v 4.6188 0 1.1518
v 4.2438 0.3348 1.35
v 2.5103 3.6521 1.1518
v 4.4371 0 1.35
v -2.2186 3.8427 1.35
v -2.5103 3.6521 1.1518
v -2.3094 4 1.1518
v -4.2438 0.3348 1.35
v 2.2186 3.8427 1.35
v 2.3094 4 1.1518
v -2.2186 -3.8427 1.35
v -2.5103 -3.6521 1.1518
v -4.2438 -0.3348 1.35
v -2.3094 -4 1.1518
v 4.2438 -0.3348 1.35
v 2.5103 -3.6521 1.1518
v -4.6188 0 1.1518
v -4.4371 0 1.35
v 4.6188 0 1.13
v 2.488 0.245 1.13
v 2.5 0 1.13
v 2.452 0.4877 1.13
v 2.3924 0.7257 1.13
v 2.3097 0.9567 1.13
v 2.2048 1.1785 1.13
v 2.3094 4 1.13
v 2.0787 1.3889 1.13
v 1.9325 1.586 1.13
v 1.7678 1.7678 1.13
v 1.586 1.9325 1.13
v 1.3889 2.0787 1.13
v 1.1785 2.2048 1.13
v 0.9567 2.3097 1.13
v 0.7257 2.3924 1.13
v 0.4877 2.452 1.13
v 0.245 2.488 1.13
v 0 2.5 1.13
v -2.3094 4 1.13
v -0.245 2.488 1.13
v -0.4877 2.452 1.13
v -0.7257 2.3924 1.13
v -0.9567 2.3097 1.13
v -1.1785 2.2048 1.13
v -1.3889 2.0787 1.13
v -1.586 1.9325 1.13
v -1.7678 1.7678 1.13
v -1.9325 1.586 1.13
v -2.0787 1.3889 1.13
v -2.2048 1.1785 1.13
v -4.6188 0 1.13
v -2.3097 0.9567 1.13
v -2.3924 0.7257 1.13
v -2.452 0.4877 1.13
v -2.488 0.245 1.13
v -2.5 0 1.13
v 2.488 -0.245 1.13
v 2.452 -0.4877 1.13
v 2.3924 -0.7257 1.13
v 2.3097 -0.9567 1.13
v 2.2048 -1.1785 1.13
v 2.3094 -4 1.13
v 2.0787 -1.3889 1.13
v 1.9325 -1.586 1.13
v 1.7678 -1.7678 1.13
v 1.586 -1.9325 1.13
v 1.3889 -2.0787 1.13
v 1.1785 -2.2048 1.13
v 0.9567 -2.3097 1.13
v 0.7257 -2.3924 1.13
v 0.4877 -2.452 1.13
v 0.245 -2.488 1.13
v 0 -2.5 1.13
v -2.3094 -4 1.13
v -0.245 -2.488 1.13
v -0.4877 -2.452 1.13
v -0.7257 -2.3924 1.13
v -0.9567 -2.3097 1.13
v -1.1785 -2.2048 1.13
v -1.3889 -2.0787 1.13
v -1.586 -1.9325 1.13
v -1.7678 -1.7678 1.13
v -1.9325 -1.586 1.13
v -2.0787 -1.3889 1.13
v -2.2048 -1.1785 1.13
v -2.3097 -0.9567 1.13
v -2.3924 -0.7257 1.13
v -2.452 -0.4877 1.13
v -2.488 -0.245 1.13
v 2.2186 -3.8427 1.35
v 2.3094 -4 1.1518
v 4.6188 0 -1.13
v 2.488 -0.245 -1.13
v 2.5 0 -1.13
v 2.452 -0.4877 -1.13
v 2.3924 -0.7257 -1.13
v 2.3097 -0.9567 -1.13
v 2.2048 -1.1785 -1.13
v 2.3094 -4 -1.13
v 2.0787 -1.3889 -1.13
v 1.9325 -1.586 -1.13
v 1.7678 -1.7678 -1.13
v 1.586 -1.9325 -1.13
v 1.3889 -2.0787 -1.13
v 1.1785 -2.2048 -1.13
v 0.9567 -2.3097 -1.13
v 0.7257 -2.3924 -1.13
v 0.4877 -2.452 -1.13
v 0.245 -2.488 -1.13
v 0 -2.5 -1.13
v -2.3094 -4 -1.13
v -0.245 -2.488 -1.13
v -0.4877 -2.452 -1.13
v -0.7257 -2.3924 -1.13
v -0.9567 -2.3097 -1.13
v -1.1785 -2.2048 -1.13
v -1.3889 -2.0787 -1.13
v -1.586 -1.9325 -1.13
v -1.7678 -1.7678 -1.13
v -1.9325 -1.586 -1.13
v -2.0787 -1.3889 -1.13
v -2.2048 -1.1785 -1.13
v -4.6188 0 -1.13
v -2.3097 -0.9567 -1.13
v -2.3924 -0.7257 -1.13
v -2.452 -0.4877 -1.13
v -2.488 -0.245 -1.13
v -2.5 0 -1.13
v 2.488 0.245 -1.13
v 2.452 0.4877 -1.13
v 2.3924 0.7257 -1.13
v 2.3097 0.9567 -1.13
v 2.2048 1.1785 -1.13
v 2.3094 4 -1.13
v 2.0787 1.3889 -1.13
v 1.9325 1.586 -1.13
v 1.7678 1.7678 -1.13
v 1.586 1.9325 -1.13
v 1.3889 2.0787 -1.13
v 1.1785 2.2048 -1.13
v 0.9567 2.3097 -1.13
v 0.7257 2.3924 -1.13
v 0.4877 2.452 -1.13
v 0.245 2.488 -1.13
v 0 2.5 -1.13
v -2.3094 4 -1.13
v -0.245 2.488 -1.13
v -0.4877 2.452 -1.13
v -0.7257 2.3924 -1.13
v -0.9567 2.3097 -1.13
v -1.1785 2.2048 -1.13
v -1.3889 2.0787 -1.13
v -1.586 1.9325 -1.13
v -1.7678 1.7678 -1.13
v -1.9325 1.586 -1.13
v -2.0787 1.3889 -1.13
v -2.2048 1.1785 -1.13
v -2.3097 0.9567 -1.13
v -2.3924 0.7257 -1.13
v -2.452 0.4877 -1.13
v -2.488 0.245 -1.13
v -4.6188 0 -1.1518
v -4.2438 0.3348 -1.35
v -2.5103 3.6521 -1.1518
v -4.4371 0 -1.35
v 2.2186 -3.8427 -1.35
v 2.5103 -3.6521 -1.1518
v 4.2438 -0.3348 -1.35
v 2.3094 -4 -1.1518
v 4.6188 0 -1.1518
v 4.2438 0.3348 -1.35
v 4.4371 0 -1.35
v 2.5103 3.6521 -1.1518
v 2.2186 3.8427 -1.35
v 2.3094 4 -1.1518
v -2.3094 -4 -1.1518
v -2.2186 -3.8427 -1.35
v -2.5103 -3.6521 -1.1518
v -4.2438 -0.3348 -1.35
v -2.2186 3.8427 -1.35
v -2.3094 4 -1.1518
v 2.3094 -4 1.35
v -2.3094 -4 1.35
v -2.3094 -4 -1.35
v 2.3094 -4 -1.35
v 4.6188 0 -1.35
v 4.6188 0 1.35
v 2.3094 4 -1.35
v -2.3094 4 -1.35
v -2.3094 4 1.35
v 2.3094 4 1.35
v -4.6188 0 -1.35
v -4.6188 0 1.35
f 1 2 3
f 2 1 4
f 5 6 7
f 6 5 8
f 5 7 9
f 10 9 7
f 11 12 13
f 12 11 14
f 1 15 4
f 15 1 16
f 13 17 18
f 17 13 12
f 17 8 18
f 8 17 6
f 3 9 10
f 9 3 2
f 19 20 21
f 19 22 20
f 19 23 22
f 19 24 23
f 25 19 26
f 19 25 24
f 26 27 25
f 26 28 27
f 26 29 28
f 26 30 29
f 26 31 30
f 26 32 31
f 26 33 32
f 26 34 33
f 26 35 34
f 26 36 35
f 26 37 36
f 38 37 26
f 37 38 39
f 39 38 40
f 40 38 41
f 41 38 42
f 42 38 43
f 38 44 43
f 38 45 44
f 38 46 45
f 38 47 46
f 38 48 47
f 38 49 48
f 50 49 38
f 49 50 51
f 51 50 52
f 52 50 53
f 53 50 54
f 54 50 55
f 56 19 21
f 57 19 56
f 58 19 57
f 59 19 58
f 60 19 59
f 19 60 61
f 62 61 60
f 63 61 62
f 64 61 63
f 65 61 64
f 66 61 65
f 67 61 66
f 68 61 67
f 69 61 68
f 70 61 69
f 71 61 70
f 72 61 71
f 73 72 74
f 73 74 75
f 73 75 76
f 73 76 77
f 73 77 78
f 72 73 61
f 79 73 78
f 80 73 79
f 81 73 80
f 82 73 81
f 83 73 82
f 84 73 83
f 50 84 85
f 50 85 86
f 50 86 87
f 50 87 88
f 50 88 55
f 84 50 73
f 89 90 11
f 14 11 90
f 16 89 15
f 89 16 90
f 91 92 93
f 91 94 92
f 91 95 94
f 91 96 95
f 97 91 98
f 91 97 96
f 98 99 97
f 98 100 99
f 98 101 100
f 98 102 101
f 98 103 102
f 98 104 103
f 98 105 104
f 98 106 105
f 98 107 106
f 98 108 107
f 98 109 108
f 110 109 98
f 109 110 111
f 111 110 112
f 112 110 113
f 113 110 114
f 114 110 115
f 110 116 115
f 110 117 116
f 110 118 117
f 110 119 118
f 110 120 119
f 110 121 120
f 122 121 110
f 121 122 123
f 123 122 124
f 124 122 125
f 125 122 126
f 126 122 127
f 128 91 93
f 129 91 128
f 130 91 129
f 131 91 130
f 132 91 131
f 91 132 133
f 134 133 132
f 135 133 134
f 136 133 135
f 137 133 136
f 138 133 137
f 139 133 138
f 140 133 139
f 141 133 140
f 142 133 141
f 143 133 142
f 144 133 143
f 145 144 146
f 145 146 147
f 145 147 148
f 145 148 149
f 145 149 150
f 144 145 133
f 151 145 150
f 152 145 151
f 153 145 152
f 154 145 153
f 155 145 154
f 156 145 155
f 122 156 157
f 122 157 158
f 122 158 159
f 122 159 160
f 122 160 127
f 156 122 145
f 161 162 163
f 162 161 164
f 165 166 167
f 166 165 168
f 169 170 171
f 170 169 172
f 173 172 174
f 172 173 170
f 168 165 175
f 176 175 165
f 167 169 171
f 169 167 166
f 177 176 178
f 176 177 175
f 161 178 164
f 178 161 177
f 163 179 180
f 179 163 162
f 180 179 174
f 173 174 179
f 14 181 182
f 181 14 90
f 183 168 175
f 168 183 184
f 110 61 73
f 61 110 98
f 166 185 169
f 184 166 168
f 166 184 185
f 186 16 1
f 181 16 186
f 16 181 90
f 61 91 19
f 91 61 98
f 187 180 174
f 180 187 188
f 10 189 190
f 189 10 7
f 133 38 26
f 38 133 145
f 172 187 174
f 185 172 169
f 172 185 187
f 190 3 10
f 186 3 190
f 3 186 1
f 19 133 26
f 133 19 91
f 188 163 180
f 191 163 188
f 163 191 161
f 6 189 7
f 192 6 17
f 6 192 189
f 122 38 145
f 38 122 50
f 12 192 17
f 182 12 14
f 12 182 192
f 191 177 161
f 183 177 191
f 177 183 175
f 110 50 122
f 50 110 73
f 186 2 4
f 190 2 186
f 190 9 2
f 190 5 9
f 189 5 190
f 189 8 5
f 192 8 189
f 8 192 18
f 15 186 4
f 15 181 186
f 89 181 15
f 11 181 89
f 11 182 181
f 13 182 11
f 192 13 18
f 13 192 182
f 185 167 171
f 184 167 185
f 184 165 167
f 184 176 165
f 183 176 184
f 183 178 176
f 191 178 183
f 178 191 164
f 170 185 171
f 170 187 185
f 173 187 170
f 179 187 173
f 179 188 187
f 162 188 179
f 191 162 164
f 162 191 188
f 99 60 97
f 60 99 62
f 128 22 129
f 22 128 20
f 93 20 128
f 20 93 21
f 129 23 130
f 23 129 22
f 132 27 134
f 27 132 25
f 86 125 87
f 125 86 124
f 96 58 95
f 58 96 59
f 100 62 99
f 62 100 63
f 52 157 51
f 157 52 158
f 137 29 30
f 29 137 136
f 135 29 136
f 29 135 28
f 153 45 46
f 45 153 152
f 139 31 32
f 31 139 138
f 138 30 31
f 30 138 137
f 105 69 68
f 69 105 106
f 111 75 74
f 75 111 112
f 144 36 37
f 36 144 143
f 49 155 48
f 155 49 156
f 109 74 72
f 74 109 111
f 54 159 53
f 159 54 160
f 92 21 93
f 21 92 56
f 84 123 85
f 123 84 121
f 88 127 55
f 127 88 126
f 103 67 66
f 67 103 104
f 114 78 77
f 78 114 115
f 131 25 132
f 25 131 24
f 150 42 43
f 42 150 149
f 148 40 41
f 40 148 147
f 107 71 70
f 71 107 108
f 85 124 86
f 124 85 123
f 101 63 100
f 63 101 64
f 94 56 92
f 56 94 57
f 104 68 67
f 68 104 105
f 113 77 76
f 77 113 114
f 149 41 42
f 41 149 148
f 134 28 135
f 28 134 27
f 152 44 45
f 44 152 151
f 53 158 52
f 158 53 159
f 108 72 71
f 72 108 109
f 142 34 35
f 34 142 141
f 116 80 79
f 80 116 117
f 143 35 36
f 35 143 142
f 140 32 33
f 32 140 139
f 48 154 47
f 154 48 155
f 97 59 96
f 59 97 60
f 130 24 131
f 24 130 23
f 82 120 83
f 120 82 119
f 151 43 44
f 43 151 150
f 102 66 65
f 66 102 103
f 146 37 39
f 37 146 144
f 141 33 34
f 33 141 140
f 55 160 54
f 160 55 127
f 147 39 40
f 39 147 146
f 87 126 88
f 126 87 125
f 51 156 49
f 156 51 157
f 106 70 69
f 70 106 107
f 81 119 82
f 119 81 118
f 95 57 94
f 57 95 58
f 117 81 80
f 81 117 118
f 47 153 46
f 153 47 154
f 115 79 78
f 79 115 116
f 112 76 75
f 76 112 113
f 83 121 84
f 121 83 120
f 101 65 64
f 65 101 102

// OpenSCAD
// Thin hex nut for M5 screw
// Specs: 8.0mm across flats, 2.7mm thick, 5.0mm round through-hole

across_flats_mm = 8.0;
thickness_mm    = 2.7;
hole_diameter_mm = 5.0;

// Small edge break (kept subtle; set to 0 for perfectly sharp edges)
edge_chamfer_mm = 0.2;

// Numerical tolerance for clean booleans
eps_mm = 0.02;

// Convert across-flats to the cylinder radius used by $fn=6 (circumradius)
hex_outer_radius_mm = across_flats_mm / sqrt(3);

module thin_hex_nut() {
    difference() {
        // Main hex body
        cylinder(h=thickness_mm, r=hex_outer_radius_mm, $fn=6, center=true);

        // Round through-hole for screw clearance
        cylinder(h=thickness_mm + 2*eps_mm, r=hole_diameter_mm/2, $fn=64, center=true);

        // Optional small chamfers (implemented as conical cuts)
        if (edge_chamfer_mm > 0) {
            // Top chamfer cut
            translate([0, 0, thickness_mm/2 - edge_chamfer_mm/2])
                cylinder(h=edge_chamfer_mm + 2*eps_mm,
                         r1=hex_outer_radius_mm + eps_mm,
                         r2=hex_outer_radius_mm - edge_chamfer_mm,
                         $fn=6, center=true);

            // Bottom chamfer cut
            translate([0, 0, -thickness_mm/2 + edge_chamfer_mm/2])
                cylinder(h=edge_chamfer_mm + 2*eps_mm,
                         r1=hex_outer_radius_mm - edge_chamfer_mm,
                         r2=hex_outer_radius_mm + eps_mm,
                         $fn=6, center=true);
        }
    }
}

thin_hex_nut();
